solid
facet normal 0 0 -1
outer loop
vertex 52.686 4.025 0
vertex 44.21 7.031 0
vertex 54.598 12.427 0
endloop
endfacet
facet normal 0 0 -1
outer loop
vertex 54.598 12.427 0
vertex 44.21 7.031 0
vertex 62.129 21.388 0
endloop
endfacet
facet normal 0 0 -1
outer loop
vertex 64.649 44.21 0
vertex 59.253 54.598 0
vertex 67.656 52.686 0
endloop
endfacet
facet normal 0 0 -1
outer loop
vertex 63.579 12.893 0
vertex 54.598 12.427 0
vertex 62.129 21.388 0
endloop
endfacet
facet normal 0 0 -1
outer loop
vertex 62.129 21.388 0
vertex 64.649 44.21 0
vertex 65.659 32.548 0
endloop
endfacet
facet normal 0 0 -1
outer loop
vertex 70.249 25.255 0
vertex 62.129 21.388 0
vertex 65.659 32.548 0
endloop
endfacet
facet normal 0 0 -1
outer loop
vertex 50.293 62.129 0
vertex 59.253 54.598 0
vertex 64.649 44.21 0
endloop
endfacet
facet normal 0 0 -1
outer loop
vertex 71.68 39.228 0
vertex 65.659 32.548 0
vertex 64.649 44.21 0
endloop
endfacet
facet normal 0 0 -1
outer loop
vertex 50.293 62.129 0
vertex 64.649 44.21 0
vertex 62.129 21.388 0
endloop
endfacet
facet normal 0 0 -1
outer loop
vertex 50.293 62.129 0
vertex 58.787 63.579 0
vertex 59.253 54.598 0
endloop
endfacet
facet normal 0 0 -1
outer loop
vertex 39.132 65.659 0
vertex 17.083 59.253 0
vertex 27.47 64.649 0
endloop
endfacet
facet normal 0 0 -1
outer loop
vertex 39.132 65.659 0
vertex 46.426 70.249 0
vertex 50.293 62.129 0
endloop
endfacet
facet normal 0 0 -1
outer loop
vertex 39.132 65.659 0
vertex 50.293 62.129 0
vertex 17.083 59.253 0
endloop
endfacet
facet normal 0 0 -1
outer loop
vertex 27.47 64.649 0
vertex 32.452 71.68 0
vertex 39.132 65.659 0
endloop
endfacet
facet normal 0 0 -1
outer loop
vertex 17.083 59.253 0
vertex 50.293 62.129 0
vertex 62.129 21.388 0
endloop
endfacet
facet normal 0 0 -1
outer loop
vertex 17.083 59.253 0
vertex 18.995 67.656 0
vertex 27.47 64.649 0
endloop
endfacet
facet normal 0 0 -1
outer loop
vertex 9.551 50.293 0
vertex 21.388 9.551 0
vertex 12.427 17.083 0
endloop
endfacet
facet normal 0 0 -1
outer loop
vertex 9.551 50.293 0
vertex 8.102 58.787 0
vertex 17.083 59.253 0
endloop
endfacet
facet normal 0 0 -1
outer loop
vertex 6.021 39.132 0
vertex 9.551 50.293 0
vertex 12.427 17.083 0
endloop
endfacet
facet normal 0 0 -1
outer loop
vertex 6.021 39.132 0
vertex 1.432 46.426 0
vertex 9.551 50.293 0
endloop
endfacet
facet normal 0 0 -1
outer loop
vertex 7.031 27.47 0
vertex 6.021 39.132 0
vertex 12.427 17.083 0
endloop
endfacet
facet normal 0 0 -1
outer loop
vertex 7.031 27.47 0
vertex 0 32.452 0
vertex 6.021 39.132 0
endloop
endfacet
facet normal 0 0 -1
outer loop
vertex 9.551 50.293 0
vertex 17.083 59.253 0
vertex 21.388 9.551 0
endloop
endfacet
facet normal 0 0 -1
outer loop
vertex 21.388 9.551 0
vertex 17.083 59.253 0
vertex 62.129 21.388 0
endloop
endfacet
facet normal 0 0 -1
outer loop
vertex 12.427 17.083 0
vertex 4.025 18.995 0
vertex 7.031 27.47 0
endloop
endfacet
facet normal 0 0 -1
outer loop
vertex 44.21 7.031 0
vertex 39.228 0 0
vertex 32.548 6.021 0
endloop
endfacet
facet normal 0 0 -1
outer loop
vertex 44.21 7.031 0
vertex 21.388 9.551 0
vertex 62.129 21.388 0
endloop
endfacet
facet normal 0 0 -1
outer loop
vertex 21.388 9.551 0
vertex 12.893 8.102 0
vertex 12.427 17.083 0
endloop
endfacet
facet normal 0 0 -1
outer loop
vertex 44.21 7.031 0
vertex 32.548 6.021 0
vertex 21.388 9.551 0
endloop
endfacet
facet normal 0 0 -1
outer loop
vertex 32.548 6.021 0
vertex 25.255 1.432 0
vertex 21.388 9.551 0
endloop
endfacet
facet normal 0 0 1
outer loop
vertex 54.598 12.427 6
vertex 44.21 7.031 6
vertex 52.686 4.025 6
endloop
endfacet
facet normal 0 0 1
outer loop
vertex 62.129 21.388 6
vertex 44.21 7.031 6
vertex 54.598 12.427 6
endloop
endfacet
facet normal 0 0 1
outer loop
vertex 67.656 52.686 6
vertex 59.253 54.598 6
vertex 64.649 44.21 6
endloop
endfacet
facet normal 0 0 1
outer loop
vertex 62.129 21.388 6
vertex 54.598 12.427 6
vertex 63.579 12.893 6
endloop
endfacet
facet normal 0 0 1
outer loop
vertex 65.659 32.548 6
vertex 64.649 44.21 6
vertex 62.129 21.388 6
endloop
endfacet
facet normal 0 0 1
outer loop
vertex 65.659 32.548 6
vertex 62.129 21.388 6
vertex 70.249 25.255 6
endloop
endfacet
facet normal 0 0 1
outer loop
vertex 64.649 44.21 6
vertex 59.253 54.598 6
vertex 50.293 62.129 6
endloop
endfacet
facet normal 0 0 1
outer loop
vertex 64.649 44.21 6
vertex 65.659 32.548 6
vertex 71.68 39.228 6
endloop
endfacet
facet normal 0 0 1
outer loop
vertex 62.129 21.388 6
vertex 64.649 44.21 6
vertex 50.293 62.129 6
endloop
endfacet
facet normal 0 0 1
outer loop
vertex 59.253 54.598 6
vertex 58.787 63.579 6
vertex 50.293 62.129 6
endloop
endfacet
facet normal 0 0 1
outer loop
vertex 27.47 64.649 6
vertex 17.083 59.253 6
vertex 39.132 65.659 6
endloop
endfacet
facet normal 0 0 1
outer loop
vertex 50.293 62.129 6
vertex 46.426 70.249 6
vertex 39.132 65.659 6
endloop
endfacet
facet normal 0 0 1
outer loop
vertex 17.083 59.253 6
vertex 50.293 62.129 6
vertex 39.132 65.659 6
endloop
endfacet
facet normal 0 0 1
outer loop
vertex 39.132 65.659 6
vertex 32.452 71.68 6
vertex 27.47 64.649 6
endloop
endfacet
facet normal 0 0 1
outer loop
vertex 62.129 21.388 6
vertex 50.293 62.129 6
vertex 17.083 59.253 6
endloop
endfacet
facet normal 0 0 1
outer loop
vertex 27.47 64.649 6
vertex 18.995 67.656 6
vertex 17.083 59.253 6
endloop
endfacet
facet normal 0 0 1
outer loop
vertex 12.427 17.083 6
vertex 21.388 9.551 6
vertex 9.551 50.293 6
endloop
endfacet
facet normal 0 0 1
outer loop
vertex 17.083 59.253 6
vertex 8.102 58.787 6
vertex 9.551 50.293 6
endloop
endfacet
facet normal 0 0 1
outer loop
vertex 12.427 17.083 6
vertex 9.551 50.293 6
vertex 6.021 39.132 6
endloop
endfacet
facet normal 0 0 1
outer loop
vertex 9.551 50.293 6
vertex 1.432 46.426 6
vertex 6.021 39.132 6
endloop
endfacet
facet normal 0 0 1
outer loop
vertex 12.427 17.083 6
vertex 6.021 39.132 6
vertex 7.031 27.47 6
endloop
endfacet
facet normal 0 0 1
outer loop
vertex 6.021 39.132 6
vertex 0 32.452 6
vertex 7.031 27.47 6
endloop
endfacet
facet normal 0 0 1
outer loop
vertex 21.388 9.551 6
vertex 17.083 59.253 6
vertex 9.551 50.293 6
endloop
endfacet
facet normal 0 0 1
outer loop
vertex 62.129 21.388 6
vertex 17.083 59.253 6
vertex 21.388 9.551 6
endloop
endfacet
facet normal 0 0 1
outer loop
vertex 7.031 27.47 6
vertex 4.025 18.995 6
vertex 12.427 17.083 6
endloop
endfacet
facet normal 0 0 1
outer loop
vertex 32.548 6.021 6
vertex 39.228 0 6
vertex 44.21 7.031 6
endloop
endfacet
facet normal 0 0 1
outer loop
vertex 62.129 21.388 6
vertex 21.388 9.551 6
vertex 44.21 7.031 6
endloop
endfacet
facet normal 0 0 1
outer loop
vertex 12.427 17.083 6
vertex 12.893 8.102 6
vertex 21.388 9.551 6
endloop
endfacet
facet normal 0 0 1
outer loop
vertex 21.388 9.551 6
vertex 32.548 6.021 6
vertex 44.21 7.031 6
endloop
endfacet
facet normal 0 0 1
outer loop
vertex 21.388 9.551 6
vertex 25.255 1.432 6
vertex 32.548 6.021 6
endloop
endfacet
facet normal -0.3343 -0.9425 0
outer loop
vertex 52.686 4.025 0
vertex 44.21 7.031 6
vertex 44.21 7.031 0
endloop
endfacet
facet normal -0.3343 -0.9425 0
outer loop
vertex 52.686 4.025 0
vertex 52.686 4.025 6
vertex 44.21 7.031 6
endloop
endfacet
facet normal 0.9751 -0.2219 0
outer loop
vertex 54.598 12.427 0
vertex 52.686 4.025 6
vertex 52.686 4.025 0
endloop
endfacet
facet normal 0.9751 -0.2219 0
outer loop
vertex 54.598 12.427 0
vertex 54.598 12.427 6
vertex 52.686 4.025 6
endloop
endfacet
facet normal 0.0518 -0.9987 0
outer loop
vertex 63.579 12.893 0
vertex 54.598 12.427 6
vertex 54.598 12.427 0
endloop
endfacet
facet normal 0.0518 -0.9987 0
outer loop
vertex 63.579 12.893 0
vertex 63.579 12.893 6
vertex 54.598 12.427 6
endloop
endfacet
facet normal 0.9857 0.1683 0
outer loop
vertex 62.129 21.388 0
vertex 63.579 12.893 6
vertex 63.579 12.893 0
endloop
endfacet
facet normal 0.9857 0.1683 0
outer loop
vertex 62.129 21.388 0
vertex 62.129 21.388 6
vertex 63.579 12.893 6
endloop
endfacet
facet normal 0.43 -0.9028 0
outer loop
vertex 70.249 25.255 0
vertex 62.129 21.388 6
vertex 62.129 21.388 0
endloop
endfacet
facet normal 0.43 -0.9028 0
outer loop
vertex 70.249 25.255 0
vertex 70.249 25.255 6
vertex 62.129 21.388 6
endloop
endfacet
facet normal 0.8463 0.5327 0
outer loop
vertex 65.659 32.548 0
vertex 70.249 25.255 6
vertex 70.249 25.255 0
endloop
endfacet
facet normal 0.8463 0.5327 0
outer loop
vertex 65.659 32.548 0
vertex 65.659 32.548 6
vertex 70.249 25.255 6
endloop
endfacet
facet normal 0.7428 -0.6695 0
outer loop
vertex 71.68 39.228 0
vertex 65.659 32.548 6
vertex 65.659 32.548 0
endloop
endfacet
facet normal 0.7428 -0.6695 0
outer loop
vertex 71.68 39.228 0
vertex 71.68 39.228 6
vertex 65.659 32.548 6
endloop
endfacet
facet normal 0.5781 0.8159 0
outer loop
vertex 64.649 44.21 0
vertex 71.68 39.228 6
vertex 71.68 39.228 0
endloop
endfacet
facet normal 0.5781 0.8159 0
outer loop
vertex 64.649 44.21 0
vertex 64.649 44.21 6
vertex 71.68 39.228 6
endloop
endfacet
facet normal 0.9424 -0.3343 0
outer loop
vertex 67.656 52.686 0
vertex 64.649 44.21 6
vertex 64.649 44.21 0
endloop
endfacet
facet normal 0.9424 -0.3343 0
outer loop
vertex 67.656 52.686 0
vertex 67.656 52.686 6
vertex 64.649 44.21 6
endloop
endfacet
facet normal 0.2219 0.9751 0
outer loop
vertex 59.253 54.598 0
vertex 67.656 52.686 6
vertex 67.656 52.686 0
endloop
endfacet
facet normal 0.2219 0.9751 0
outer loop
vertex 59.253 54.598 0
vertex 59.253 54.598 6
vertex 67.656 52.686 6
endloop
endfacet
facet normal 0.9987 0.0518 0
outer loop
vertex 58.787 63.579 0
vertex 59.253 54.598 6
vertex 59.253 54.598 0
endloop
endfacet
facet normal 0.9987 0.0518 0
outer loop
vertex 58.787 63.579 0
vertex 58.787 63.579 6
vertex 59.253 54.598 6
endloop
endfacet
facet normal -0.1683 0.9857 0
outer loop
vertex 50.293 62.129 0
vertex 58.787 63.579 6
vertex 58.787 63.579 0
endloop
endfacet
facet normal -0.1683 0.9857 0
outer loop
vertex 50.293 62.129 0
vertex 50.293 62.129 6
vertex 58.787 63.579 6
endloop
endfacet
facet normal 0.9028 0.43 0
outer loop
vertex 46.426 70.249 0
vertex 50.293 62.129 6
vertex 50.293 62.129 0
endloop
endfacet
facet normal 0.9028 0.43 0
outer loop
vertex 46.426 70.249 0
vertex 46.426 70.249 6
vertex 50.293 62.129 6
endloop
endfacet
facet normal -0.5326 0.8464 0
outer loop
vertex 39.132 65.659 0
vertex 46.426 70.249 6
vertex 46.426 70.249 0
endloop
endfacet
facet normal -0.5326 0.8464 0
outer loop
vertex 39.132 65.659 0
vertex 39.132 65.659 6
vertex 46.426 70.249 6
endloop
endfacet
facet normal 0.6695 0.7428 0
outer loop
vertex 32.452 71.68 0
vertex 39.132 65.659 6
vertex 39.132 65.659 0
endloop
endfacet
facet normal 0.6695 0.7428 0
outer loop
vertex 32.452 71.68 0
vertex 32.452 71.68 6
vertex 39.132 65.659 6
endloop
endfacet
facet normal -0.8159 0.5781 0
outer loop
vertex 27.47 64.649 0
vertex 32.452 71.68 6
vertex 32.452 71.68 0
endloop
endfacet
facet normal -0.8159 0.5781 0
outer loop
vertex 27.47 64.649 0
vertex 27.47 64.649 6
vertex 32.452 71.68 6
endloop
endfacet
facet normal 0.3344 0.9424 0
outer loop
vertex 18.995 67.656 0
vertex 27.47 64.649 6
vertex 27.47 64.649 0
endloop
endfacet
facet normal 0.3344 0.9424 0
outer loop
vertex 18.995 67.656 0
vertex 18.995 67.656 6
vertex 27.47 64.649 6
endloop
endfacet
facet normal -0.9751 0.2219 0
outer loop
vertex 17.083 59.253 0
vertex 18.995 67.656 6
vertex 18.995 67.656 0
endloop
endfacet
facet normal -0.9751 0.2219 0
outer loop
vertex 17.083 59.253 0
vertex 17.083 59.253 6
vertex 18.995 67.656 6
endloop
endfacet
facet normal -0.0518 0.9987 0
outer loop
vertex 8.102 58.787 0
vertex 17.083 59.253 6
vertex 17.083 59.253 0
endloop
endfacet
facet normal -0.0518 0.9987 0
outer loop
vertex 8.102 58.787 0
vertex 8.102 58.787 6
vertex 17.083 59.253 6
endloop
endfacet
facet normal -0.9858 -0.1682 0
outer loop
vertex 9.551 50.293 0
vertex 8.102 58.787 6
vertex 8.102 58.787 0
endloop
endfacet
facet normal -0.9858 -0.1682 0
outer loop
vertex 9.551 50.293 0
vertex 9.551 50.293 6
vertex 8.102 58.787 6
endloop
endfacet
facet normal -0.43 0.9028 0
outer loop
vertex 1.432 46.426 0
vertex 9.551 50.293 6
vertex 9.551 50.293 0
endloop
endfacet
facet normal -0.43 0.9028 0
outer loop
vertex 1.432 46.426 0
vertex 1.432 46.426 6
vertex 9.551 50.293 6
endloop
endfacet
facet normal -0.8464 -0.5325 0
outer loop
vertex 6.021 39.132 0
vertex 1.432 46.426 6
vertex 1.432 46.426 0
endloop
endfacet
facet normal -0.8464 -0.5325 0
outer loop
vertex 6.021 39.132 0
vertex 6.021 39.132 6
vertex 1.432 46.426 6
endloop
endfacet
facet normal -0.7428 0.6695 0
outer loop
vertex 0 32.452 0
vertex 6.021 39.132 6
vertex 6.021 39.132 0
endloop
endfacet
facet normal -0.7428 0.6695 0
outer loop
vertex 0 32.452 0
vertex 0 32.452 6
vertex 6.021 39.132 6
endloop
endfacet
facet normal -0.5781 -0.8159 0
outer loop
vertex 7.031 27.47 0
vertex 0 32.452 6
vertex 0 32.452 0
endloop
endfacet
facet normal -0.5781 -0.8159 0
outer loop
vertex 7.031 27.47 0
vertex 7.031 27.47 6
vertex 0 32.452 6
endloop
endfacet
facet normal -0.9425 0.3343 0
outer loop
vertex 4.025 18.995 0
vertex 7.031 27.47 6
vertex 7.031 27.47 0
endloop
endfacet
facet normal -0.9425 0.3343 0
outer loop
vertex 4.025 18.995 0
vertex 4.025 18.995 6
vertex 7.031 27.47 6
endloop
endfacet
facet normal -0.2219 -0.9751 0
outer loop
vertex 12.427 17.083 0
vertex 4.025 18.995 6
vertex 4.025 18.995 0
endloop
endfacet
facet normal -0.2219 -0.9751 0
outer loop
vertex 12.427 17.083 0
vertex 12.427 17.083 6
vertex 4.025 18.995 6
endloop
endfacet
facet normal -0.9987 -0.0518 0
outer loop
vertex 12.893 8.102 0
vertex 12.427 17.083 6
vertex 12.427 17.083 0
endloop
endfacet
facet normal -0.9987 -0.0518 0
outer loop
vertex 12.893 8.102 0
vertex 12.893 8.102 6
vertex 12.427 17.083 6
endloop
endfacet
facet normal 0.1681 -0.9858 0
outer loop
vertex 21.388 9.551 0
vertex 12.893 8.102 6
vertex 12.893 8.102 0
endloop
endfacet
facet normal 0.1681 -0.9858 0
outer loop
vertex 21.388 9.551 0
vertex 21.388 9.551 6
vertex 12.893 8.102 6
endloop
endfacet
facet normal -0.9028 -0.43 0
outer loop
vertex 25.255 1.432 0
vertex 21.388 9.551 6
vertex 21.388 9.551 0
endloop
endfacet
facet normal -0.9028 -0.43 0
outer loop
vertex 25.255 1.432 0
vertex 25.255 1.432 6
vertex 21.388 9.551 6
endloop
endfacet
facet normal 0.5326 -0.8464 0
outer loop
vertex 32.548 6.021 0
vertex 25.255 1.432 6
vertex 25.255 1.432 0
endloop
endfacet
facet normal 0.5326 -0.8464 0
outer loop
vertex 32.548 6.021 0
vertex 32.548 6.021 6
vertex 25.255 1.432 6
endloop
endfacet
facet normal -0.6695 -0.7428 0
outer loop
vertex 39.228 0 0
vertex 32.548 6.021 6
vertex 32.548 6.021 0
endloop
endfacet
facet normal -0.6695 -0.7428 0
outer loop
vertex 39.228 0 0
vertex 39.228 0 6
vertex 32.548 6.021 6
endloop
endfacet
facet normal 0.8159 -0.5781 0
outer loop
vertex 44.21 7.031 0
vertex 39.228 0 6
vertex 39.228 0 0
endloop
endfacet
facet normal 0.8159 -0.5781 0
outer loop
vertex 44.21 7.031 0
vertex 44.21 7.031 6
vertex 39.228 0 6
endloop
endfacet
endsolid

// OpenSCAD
$fn = 32;

// ----------------------------------------------------------------------
// Chain sprocket: 16 teeth, 30 mm root radius
// ----------------------------------------------------------------------

// --- parameters (mm) ---
profile_height = 6;       // extrusion height
profile_points = 32;      // points of the closed outline

profile = [[65.659, 32.548], [71.68, 39.228], [64.649, 44.21], [67.656, 52.686], [59.253, 54.598], [58.787, 63.579], [50.293, 62.129], [46.426, 70.249], [39.132, 65.659], [32.452, 71.68], [27.47, 64.649], [18.995, 67.656], [17.083, 59.253], [8.102, 58.787], [9.551, 50.293], [1.432, 46.426], [6.021, 39.132], [0, 32.452], [7.031, 27.47], [4.025, 18.995], [12.427, 17.083], [12.893, 8.102], [21.388, 9.551], [25.255, 1.432], [32.548, 6.021], [39.228, 0], [44.21, 7.031], [52.686, 4.025], [54.598, 12.427], [63.579, 12.893], [62.129, 21.388], [70.249, 25.255]];  // single closed polygon, 32 points, counter clockwise

// --- the one profile operation ---
linear_extrude(height = profile_height) polygon(points = profile);
